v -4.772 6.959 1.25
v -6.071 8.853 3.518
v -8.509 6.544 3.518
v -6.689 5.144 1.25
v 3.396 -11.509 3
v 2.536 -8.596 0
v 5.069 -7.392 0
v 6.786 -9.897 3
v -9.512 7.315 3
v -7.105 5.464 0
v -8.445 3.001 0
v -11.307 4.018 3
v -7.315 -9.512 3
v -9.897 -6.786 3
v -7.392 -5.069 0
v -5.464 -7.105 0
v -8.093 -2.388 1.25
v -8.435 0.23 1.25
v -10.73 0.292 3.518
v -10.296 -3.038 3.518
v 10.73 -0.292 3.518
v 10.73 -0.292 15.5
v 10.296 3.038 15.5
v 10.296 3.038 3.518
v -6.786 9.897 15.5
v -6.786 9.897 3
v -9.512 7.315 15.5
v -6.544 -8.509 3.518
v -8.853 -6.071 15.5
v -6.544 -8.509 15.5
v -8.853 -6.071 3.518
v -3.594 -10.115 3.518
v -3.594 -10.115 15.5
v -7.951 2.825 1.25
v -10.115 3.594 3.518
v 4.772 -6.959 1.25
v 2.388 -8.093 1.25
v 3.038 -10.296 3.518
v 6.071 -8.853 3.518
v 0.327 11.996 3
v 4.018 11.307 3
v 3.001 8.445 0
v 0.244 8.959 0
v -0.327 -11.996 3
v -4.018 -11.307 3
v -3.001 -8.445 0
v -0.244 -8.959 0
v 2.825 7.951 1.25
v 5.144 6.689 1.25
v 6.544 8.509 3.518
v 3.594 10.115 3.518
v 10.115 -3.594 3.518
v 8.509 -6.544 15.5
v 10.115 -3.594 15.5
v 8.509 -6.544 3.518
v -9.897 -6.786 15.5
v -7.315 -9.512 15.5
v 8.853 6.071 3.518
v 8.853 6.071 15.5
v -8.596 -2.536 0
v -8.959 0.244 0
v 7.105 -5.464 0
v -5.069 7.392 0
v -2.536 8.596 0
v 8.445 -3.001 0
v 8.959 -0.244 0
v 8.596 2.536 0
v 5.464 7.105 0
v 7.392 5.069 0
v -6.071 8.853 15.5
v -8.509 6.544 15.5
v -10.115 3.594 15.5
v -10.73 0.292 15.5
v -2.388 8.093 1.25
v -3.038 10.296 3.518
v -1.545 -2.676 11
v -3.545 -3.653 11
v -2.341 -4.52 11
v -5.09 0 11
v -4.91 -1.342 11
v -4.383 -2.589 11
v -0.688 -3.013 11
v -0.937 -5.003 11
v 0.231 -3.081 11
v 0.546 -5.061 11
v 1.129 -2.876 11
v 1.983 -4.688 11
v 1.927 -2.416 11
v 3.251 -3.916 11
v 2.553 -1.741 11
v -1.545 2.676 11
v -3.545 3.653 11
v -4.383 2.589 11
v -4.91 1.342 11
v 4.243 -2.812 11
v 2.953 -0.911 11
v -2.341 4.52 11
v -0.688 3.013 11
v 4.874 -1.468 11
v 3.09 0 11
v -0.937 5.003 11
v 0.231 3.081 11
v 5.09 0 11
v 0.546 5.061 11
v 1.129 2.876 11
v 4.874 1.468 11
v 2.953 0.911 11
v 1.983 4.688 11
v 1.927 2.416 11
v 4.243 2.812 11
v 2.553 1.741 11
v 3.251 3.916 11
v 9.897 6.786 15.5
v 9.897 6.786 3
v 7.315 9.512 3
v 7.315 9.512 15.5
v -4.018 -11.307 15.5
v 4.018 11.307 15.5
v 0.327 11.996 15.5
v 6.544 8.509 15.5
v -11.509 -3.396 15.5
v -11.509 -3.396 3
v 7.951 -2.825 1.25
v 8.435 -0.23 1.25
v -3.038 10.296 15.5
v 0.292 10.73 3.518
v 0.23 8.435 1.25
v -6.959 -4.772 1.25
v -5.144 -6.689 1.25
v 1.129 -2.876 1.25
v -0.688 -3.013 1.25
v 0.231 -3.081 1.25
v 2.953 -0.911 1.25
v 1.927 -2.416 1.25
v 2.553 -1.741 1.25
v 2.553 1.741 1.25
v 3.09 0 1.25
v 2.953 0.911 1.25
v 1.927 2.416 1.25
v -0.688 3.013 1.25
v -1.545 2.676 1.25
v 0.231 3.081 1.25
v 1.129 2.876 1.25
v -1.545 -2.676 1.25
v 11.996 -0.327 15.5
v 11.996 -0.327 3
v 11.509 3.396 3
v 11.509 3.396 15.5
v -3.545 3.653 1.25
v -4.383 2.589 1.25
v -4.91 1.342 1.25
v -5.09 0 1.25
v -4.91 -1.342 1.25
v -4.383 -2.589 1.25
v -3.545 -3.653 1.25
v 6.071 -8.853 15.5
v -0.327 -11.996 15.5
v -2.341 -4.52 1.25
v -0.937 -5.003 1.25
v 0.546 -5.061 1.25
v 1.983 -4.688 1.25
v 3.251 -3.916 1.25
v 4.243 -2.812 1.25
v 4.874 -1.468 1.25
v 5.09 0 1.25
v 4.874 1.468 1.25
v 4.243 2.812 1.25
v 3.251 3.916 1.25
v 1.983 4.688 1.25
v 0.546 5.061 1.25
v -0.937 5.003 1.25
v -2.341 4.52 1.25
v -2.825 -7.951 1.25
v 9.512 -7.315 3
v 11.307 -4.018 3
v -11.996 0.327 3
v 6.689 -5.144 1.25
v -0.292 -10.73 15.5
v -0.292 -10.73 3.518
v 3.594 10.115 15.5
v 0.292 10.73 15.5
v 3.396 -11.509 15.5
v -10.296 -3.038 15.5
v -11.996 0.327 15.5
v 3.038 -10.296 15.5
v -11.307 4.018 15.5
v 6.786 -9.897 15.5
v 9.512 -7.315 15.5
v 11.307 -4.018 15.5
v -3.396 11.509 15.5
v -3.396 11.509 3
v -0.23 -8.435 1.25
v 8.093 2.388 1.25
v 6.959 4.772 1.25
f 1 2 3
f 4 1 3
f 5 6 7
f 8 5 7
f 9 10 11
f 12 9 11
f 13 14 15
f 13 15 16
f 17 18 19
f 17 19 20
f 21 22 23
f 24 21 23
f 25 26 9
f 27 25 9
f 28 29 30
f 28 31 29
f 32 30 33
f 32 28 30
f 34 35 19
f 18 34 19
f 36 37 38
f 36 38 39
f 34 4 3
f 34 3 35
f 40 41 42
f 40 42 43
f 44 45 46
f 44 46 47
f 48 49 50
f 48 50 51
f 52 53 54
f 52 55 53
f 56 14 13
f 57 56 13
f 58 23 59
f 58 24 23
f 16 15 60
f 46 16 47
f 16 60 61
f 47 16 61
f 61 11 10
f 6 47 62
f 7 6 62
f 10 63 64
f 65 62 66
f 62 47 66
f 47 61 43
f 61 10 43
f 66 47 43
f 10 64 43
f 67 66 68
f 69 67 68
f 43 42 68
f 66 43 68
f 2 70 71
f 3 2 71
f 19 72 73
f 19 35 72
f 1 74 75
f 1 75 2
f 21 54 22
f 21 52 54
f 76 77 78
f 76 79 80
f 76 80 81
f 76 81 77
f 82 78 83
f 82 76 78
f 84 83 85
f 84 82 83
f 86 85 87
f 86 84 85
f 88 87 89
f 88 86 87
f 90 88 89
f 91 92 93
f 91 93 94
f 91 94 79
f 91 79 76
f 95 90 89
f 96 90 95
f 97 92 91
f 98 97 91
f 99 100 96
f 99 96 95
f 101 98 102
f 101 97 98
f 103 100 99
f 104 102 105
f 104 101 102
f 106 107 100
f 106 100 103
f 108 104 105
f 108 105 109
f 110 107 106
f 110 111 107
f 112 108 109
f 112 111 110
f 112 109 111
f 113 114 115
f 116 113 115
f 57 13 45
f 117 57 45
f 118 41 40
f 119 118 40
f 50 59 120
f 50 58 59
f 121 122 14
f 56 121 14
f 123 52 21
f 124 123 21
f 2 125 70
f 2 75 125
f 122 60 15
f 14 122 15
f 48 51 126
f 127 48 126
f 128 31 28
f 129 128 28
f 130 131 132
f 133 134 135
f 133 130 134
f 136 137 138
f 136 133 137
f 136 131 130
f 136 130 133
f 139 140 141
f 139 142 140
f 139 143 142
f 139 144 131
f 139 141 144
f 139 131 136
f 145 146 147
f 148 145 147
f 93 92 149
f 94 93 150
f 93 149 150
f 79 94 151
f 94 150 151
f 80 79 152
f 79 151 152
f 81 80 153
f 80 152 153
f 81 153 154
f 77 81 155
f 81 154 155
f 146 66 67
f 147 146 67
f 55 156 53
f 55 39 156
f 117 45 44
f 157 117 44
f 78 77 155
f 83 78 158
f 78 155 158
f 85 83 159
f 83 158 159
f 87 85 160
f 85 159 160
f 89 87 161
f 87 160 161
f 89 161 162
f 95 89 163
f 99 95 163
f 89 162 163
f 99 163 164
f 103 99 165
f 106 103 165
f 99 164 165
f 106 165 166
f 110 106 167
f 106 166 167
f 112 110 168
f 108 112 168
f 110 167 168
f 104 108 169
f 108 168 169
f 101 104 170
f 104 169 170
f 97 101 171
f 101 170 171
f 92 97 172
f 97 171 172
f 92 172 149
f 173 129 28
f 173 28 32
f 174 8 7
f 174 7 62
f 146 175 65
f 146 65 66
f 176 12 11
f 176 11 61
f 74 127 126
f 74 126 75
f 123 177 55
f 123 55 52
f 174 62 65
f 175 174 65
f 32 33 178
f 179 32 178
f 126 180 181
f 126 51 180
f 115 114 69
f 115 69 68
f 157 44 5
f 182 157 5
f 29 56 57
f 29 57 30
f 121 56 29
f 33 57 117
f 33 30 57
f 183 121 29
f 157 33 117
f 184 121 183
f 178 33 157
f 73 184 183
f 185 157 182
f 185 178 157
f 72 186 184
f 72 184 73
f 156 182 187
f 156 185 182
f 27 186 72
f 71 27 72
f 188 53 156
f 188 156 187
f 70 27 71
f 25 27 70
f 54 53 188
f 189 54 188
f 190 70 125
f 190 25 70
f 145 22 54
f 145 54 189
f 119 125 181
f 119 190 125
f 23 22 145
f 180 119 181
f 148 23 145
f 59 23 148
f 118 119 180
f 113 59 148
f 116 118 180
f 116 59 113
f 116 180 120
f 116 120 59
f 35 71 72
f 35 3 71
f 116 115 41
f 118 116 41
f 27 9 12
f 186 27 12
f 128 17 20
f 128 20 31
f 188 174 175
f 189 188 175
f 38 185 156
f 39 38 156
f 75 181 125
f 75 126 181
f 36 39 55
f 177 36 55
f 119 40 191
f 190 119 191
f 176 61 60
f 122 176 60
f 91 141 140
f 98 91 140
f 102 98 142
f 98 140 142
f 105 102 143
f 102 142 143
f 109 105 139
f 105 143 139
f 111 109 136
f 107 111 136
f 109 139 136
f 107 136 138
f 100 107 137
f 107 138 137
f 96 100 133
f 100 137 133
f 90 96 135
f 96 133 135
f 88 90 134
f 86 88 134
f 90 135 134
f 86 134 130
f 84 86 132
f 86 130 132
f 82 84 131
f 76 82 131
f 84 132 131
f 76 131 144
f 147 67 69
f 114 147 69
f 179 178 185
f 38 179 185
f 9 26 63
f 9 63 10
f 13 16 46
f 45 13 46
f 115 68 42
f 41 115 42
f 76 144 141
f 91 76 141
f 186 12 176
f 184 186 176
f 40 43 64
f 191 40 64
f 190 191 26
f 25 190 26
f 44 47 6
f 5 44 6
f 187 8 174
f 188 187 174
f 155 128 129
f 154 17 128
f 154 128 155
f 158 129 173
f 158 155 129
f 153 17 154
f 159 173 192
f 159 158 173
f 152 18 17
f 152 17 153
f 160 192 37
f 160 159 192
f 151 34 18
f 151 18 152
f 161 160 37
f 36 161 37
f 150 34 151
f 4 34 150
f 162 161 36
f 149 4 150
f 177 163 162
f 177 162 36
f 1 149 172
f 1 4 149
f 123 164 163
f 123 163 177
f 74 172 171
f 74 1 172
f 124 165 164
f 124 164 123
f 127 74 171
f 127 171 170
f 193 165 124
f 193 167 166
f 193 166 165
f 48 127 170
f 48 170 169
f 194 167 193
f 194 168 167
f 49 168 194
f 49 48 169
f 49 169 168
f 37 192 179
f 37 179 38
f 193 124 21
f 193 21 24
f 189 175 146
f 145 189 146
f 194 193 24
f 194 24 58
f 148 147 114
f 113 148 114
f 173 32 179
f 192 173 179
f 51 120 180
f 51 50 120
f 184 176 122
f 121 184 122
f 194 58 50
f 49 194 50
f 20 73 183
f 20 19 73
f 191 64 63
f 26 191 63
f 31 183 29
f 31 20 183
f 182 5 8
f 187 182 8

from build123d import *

# Parameters (mm, degrees)
F1_DEPTH = 15.5
F2_SIZE  = 3
F3_T     = -1.25
F4_DEPTH = 11


with BuildPart() as f1:
    # F0 (on Top) → F1 (new body)
    with BuildSketch(Plane.XY):
        Polygon((9.512444, -7.315286), (11.30742, -4.017743), (11.995546, -0.326916), (11.509465, 3.395912), (9.896757, 6.786325), (7.315286, 9.512444), (4.017743, 11.30742), (0.326916, 11.995546), (-3.395912, 11.509465), (-6.786325, 9.896757), (-9.512444, 7.315286), (-11.30742, 4.017743), (-11.995546, 0.326916), (-11.509465, -3.395912), (-9.896757, -6.786325), (-7.315286, -9.512444), (-4.017743, -11.30742), (-0.326916, -11.995546), (3.395912, -11.509465), (6.786325, -9.896757), align=None)
        with BuildLine():
            ThreePointArc((-3.545, 3.652544), (5.09, 0), (-3.545, -3.652544))
            ThreePointArc((-3.545, -3.652544), (-5.09, 0), (-3.545, 3.652544))
        make_face(mode=Mode.SUBTRACT)
        with BuildLine():
            Line((-3.545, 3.652544), (-3.545, -3.652544))
            ThreePointArc((-3.545, -3.652544), (5.09, 0), (-3.545, 3.652544))
        make_face()
        with BuildLine():
            ThreePointArc((-1.545, 2.676018), (3.09, 0), (-1.545, -2.676018))
            Line((-1.545, -2.676018), (-1.545, 2.676018))
        make_face(mode=Mode.SUBTRACT)
        with BuildLine():
            Line((-1.545, 2.676018), (-1.545, -2.676018))
            ThreePointArc((-1.545, -2.676018), (3.09, 0), (-1.545, 2.676018))
        make_face()
        with BuildLine():
            ThreePointArc((-3.545, 3.652544), (-5.09, 0), (-3.545, -3.652544))
            Line((-3.545, -3.652544), (-3.545, 3.652544))
        make_face()
    extrude(amount=F1_DEPTH)

    # F2
    f2_edges = [f1.edges().sort_by_distance(p)[0] for p in [
        (-10.703111, -5.091118, 0),
        (-8.606021, -8.149385, 0),
        (-5.666514, -10.409932, 0),
        (-2.172329, -11.651483, 0),
        (1.534498, -11.752505, 0),
        (5.091118, -10.703111, 0),
        (8.149385, -8.606021, 0),
        (10.409932, -5.666514, 0),
        (11.651483, -2.172329, 0),
        (11.752505, 1.534498, 0),
        (10.703111, 5.091118, 0),
        (8.606021, 8.149385, 0),
        (5.666514, 10.409932, 0),
        (2.172329, 11.651483, 0),
        (-1.534498, 11.752505, 0),
        (-5.091118, 10.703111, 0),
        (-8.149385, 8.606021, 0),
        (-10.409932, 5.666514, 0),
        (-11.651483, 2.172329, 0),
        (-11.752505, -1.534498, 0),
    ]]
    chamfer(f2_edges, length=F2_SIZE)

    # F3
    f3_openings = [f1.faces().sort_by_distance(p)[0] for p in [
        (0, 0, 15.5),
    ]]
    offset(amount=F3_T, openings=f3_openings)

    # F0 (on Top) → F4 (join)
    with BuildSketch(Plane.XY):
        with BuildLine():
            Line((-3.545, 3.652544), (-3.545, -3.652544))
            ThreePointArc((-3.545, -3.652544), (5.09, 0), (-3.545, 3.652544))
        make_face()
        with BuildLine():
            ThreePointArc((-1.545, 2.676018), (3.09, 0), (-1.545, -2.676018))
            Line((-1.545, -2.676018), (-1.545, 2.676018))
        make_face(mode=Mode.SUBTRACT)
        with BuildLine():
            ThreePointArc((-3.545, 3.652544), (-5.09, 0), (-3.545, -3.652544))
            Line((-3.545, -3.652544), (-3.545, 3.652544))
        make_face()
    extrude(amount=F4_DEPTH)


solid = f1.part
